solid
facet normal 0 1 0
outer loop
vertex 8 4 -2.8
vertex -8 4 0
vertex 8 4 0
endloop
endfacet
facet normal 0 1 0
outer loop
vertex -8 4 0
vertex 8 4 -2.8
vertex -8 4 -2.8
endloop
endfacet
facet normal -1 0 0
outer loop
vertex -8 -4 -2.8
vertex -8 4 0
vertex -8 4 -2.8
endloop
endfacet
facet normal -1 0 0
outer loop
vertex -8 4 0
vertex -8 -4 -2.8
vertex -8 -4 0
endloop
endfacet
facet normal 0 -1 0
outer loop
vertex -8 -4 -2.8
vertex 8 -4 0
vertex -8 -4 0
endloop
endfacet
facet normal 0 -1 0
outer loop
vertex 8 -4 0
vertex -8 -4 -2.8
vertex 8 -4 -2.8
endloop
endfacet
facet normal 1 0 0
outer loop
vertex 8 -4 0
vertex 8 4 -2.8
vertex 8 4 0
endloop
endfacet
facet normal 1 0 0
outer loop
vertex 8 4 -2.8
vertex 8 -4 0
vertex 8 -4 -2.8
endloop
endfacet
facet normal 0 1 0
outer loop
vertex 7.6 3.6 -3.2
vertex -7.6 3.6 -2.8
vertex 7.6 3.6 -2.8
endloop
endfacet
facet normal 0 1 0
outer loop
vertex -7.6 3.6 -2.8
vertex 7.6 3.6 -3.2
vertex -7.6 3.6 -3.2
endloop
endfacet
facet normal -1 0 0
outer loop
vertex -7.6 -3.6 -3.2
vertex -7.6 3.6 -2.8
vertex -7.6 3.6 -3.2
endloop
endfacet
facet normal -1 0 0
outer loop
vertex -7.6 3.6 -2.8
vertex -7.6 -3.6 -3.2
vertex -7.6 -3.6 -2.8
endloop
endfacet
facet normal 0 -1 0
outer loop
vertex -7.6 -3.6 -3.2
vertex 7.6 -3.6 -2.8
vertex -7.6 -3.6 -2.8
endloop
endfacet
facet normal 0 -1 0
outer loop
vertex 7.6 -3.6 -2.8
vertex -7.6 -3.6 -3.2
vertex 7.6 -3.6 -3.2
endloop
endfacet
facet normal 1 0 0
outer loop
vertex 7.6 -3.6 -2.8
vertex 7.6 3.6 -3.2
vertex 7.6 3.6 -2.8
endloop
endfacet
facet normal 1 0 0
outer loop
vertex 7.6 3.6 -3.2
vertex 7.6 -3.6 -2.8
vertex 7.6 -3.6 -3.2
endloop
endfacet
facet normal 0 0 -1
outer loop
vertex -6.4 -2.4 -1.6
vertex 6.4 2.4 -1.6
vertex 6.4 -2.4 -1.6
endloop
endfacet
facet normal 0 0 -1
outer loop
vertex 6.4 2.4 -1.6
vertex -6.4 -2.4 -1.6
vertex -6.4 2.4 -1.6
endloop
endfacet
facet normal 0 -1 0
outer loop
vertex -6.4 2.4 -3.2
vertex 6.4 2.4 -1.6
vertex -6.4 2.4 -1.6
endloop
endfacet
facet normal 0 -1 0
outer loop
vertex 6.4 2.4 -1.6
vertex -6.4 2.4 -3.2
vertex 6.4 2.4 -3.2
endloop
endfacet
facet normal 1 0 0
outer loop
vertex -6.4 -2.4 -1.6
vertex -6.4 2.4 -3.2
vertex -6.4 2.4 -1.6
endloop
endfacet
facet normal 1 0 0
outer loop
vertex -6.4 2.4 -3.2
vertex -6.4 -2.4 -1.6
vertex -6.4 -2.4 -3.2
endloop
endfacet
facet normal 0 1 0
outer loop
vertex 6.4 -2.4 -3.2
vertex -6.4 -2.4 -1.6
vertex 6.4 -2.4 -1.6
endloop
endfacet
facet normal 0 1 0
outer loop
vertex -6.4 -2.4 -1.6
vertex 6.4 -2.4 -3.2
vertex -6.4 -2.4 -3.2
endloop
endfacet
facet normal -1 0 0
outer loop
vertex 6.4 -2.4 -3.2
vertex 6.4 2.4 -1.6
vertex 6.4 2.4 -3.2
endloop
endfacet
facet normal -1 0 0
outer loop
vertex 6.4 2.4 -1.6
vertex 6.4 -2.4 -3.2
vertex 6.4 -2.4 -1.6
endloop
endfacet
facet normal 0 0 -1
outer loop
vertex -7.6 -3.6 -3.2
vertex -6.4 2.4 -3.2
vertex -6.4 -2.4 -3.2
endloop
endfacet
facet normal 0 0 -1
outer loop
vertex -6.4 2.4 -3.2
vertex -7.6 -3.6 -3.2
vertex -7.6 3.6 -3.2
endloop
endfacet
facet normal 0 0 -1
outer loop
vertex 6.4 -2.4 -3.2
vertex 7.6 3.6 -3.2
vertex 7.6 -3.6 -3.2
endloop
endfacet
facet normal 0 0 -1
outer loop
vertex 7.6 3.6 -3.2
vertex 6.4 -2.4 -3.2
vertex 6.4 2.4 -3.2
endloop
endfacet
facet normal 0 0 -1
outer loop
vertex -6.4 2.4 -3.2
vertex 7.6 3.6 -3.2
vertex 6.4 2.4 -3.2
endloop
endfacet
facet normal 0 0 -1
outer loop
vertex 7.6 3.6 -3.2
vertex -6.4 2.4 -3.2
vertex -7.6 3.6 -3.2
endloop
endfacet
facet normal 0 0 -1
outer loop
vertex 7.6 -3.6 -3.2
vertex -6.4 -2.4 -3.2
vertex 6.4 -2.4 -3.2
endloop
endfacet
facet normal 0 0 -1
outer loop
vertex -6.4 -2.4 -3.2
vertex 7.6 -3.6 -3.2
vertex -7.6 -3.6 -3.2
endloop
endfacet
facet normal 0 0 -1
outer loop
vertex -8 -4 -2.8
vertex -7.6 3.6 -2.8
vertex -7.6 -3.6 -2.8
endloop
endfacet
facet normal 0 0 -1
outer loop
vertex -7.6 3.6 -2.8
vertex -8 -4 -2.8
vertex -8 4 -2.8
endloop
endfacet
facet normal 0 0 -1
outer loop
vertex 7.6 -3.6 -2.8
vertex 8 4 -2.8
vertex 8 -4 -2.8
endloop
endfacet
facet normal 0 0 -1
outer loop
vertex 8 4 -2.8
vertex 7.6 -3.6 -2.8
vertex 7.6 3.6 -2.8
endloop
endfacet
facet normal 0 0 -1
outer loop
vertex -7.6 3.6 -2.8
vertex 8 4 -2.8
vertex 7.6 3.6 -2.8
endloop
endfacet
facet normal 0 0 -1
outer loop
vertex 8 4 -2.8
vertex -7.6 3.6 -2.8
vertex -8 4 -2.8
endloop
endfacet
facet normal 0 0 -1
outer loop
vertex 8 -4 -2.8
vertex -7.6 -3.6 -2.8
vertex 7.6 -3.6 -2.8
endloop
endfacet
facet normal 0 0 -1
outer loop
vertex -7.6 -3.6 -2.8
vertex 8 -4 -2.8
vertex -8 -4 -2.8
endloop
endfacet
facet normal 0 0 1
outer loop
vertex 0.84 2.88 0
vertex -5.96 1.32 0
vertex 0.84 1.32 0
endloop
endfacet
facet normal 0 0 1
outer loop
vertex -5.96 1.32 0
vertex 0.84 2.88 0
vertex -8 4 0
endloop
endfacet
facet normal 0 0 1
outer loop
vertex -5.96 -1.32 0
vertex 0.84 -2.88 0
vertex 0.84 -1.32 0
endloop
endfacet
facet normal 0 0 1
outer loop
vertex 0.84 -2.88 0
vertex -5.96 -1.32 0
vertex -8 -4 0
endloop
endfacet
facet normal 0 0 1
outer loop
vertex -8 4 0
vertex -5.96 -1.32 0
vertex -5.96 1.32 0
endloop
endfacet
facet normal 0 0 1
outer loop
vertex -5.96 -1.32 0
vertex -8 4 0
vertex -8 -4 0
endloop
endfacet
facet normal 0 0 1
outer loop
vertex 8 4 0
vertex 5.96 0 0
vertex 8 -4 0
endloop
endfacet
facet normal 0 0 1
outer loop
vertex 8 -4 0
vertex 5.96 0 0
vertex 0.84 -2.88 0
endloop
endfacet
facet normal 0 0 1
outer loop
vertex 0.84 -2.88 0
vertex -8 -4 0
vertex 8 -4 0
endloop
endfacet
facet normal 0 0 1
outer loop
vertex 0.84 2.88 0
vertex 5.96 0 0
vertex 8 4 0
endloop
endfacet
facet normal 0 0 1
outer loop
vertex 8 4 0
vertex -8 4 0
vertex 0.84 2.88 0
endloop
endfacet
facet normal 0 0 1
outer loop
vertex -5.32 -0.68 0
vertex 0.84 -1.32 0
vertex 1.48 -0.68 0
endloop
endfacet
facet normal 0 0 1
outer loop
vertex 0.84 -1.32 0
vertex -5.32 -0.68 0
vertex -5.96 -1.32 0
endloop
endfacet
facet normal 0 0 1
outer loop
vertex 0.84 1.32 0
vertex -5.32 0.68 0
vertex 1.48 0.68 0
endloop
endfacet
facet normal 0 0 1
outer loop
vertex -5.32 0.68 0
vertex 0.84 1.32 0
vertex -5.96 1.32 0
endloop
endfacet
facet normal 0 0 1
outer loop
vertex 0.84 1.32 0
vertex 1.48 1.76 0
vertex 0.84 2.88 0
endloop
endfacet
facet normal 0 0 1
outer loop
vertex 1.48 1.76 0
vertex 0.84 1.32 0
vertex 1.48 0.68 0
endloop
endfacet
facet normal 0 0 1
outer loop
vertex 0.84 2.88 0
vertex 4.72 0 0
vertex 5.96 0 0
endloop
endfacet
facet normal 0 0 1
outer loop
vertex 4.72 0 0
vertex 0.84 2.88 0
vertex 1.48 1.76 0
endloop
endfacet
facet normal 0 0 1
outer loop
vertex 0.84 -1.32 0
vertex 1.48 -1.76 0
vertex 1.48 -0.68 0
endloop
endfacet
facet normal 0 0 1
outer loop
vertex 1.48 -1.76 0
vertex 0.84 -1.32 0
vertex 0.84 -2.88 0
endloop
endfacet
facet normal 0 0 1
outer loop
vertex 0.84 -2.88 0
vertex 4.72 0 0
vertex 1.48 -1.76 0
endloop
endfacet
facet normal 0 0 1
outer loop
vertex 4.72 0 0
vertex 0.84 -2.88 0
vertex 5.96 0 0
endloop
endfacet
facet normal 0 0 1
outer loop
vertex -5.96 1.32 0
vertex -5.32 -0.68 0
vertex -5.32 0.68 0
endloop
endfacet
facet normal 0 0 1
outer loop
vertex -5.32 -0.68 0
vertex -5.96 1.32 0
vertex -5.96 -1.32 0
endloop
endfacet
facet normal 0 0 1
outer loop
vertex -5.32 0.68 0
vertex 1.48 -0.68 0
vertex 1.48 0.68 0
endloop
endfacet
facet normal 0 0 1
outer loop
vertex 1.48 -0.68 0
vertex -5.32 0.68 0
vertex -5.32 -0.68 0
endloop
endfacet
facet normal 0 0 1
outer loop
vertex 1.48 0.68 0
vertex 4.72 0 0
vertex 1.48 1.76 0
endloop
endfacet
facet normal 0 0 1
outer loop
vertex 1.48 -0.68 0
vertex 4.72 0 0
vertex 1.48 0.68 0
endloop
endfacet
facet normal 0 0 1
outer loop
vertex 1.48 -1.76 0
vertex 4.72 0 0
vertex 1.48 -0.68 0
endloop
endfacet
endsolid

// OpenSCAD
// file: ../p/4-4edge.scad
use <../lib.scad>
$fa=1; $fs=0.2;
function ldraw_lib__4_4edge(realsolid=false) = [
// 0 Circle 1.0
// 0 Name: 4-4edge.dat
// 0 Author: James Jessiman
// 0 !LDRAW_ORG Primitive UPDATE 2017-01
// 0 !LICENSE Licensed under CC BY 2.0 and CC BY 4.0 : see CAreadme.txt
// 
// 0 BFC CERTIFY CCW
  [0,"BFC","CERTIFY"],
  [0,"BFC","CCW"],
// 
// 0 !HISTORY 1998-12-15 [PTadmin] Official Update 1998-10
// 0 !HISTORY 2005-12-28 [PTadmin] Official Update 2005-01
// 0 !HISTORY 2007-06-24 [PTadmin] Header formatted for Contributor Agreement
// 0 !HISTORY 2008-07-01 [PTadmin] Official Update 2008-01
// 0 !HISTORY 2017-01-15 [Steffen] BFCed
// 0 !HISTORY 2017-12-30 [PTadmin] Official Update 2017-01
// 
// 
// 2 24 1 0 0 0.9239 0 0.3827
  [2,24,1,0,0,0.9239,0,0.3827],
// 2 24 0.9239 0 0.3827 0.7071 0 0.7071
  [2,24,0.9239,0,0.3827,0.7071,0,0.7071],
// 2 24 0.7071 0 0.7071 0.3827 0 0.9239
  [2,24,0.7071,0,0.7071,0.3827,0,0.9239],
// 2 24 0.3827 0 0.9239 0 0 1
  [2,24,0.3827,0,0.9239,0,0,1],
// 2 24 0 0 1 -0.3827 0 0.9239
  [2,24,0,0,1,-0.3827,0,0.9239],
// 2 24 -0.3827 0 0.9239 -0.7071 0 0.7071
  [2,24,-0.3827,0,0.9239,-0.7071,0,0.7071],
// 2 24 -0.7071 0 0.7071 -0.9239 0 0.3827
  [2,24,-0.7071,0,0.7071,-0.9239,0,0.3827],
// 2 24 -0.9239 0 0.3827 -1 0 -0
  [2,24,-0.9239,0,0.3827,-1,0,-0],
// 2 24 -1 0 -0 -0.9239 0 -0.3827
  [2,24,-1,0,-0,-0.9239,0,-0.3827],
// 2 24 -0.9239 0 -0.3827 -0.7071 0 -0.7071
  [2,24,-0.9239,0,-0.3827,-0.7071,0,-0.7071],
// 2 24 -0.7071 0 -0.7071 -0.3827 0 -0.9239
  [2,24,-0.7071,0,-0.7071,-0.3827,0,-0.9239],
// 2 24 -0.3827 0 -0.9239 0 0 -1
  [2,24,-0.3827,0,-0.9239,0,0,-1],
// 2 24 0 0 -1 0.3827 0 -0.9239
  [2,24,0,0,-1,0.3827,0,-0.9239],
// 2 24 0.3827 0 -0.9239 0.7071 0 -0.7071
  [2,24,0.3827,0,-0.9239,0.7071,0,-0.7071],
// 2 24 0.7071 0 -0.7071 0.9239 0 -0.3827
  [2,24,0.7071,0,-0.7071,0.9239,0,-0.3827],
// 2 24 0.9239 0 -0.3827 1 0 0
  [2,24,0.9239,0,-0.3827,1,0,0],
];
module ldraw_lib__4_4edge(step=0, col=false, unit=2/5, alt=false, line=0.2, solid=!$preview)
    makepoly(ldraw_lib__4_4edge(solid), step=step, col=col, unit=unit, alt=alt, line=line, solid=solid);
ldraw_lib__4_4edge(line=0.2);
// file: ../p/4-4disc.scad
use <../lib.scad>
$fa=1; $fs=0.2;
function ldraw_lib__4_4disc(realsolid=false) = [
// 0 Disc 1.0
// 0 Name: 4-4disc.dat
// 0 Author: James Jessiman
// 0 !LDRAW_ORG Primitive UPDATE 2002-02
// 0 !LICENSE Licensed under CC BY 2.0 and CC BY 4.0 : see CAreadme.txt
// 
// 0 BFC CERTIFY CCW
  [0,"BFC","CERTIFY"],
  [0,"BFC","CCW"],
// 
// 0 !HISTORY 1998-12-15 [PTadmin] Official Update 1998-10
// 0 !HISTORY 2002-03-23 [sbliss] Added BFC statement
// 0 !HISTORY 2002-04-25 [PTadmin] Official Update 2002-02
// 0 !HISTORY 2007-06-24 [PTadmin] Header formatted for Contributor Agreement
// 0 !HISTORY 2008-07-01 [PTadmin] Official Update 2008-01
// 
// 
// 3 16 0 0 0 1 0 0 0.9239 0 0.3827
  [3,16,0,0,0,1,0,0,0.9239,0,0.3827],
// 3 16 0 0 0 0.9239 0 0.3827 0.7071 0 0.7071
  [3,16,0,0,0,0.9239,0,0.3827,0.7071,0,0.7071],
// 3 16 0 0 0 0.7071 0 0.7071 0.3827 0 0.9239
  [3,16,0,0,0,0.7071,0,0.7071,0.3827,0,0.9239],
// 3 16 0 0 0 0.3827 0 0.9239 0 0 1
  [3,16,0,0,0,0.3827,0,0.9239,0,0,1],
// 3 16 0 0 0 0 0 1 -0.3827 0 0.9239
  [3,16,0,0,0,0,0,1,-0.3827,0,0.9239],
// 3 16 0 0 0 -0.3827 0 0.9239 -0.7071 0 0.7071
  [3,16,0,0,0,-0.3827,0,0.9239,-0.7071,0,0.7071],
// 3 16 0 0 0 -0.7071 0 0.7071 -0.9239 0 0.3827
  [3,16,0,0,0,-0.7071,0,0.7071,-0.9239,0,0.3827],
// 3 16 0 0 0 -0.9239 0 0.3827 -1 0 -0
  [3,16,0,0,0,-0.9239,0,0.3827,-1,0,-0],
// 3 16 0 0 0 -1 0 -0 -0.9239 0 -0.3827
  [3,16,0,0,0,-1,0,-0,-0.9239,0,-0.3827],
// 3 16 0 0 0 -0.9239 0 -0.3827 -0.7071 0 -0.7071
  [3,16,0,0,0,-0.9239,0,-0.3827,-0.7071,0,-0.7071],
// 3 16 0 0 0 -0.7071 0 -0.7071 -0.3827 0 -0.9239
  [3,16,0,0,0,-0.7071,0,-0.7071,-0.3827,0,-0.9239],
// 3 16 0 0 0 -0.3827 0 -0.9239 0 0 -1
  [3,16,0,0,0,-0.3827,0,-0.9239,0,0,-1],
// 3 16 0 0 0 0 0 -1 0.3827 0 -0.9239
  [3,16,0,0,0,0,0,-1,0.3827,0,-0.9239],
// 3 16 0 0 0 0.3827 0 -0.9239 0.7071 0 -0.7071
  [3,16,0,0,0,0.3827,0,-0.9239,0.7071,0,-0.7071],
// 3 16 0 0 0 0.7071 0 -0.7071 0.9239 0 -0.3827
  [3,16,0,0,0,0.7071,0,-0.7071,0.9239,0,-0.3827],
// 3 16 0 0 0 0.9239 0 -0.3827 1 0 0
  [3,16,0,0,0,0.9239,0,-0.3827,1,0,0],
// 0
];
module ldraw_lib__4_4disc(step=0, col=false, unit=2/5, alt=false, line=0.2, solid=!$preview)
    makepoly(ldraw_lib__4_4disc(solid), step=step, col=col, unit=unit, alt=alt, line=line, solid=solid);
ldraw_lib__4_4disc(line=0.2);
// file: ../p/4-4cyli.scad
use <../lib.scad>
$fa=1; $fs=0.2;
function ldraw_lib__4_4cyli(realsolid=false) = [
// 0 Cylinder 1.0
// 0 Name: 4-4cyli.dat
// 0 Author: James Jessiman
// 0 !LDRAW_ORG Primitive UPDATE 2005-01
// 0 !LICENSE Licensed under CC BY 2.0 and CC BY 4.0 : see CAreadme.txt
// 
// 0 BFC CERTIFY CCW
  [0,"BFC","CERTIFY"],
  [0,"BFC","CCW"],
// 
// 0 !HISTORY 1998-12-15 [PTadmin] Official Update 1998-10
// 0 !HISTORY 2002-03-23 [sbliss] Added BFC statement; merged headers from files in distributions LDraw 0.27 and Complete.
// 0 !HISTORY 2002-04-25 [PTadmin] Official Update 2002-02
// 0 !HISTORY 2004-12-14 [guyvivan] BFC CCW
// 0 !HISTORY 2005-12-28 [PTadmin] Official Update 2005-01
// 0 !HISTORY 2007-06-24 [PTadmin] Header formatted for Contributor Agreement
// 0 !HISTORY 2008-07-01 [PTadmin] Official Update 2008-01
// 
// 
// 4 16 1 1 0 0.9239 1 0.3827 0.9239 0 0.3827 1 0 0
  [4,16,1,1,0,0.9239,1,0.3827,0.9239,0,0.3827,1,0,0],
// 5 24 1 0 0 1 1 0 0.9239 0 0.3827 0.9239 0 -0.3827
  [5,24,1,0,0,1,1,0,0.9239,0,0.3827,0.9239,0,-0.3827],
// 4 16 0.9239 1 0.3827 0.7071 1 0.7071 0.7071 0 0.7071 0.9239 0 0.3827
  [4,16,0.9239,1,0.3827,0.7071,1,0.7071,0.7071,0,0.7071,0.9239,0,0.3827],
// 5 24 0.9239 0 0.3827 0.9239 1 0.3827 0.7071 0 0.7071 1 0 0
  [5,24,0.9239,0,0.3827,0.9239,1,0.3827,0.7071,0,0.7071,1,0,0],
// 4 16 0.7071 1 0.7071 0.3827 1 0.9239 0.3827 0 0.9239 0.7071 0 0.7071
  [4,16,0.7071,1,0.7071,0.3827,1,0.9239,0.3827,0,0.9239,0.7071,0,0.7071],
// 5 24 0.7071 0 0.7071 0.7071 1 0.7071 0.3827 0 0.9239 0.9239 0 0.3827
  [5,24,0.7071,0,0.7071,0.7071,1,0.7071,0.3827,0,0.9239,0.9239,0,0.3827],
// 4 16 0.3827 1 0.9239 0 1 1 0 0 1 0.3827 0 0.9239
  [4,16,0.3827,1,0.9239,0,1,1,0,0,1,0.3827,0,0.9239],
// 5 24 0.3827 0 0.9239 0.3827 1 0.9239 0 0 1 0.7071 0 0.7071
  [5,24,0.3827,0,0.9239,0.3827,1,0.9239,0,0,1,0.7071,0,0.7071],
// 4 16 0 1 1 -0.3827 1 0.9239 -0.3827 0 0.9239 0 0 1
  [4,16,0,1,1,-0.3827,1,0.9239,-0.3827,0,0.9239,0,0,1],
// 5 24 0 0 1 0 1 1 -0.3827 0 0.9239 0.3827 0 0.9239
  [5,24,0,0,1,0,1,1,-0.3827,0,0.9239,0.3827,0,0.9239],
// 4 16 -0.3827 1 0.9239 -0.7071 1 0.7071 -0.7071 0 0.7071 -0.3827 0 0.9239
  [4,16,-0.3827,1,0.9239,-0.7071,1,0.7071,-0.7071,0,0.7071,-0.3827,0,0.9239],
// 5 24 -0.3827 0 0.9239 -0.3827 1 0.9239 -0.7071 0 0.7071 0 0 1
  [5,24,-0.3827,0,0.9239,-0.3827,1,0.9239,-0.7071,0,0.7071,0,0,1],
// 4 16 -0.7071 1 0.7071 -0.9239 1 0.3827 -0.9239 0 0.3827 -0.7071 0 0.7071
  [4,16,-0.7071,1,0.7071,-0.9239,1,0.3827,-0.9239,0,0.3827,-0.7071,0,0.7071],
// 5 24 -0.7071 0 0.7071 -0.7071 1 0.7071 -0.9239 0 0.3827 -0.3827 0 0.9239
  [5,24,-0.7071,0,0.7071,-0.7071,1,0.7071,-0.9239,0,0.3827,-0.3827,0,0.9239],
// 4 16 -0.9239 1 0.3827 -1 1 0 -1 0 0 -0.9239 0 0.3827
  [4,16,-0.9239,1,0.3827,-1,1,0,-1,0,0,-0.9239,0,0.3827],
// 5 24 -0.9239 0 0.3827 -0.9239 1 0.3827 -1 0 0 -0.7071 0 0.7071
  [5,24,-0.9239,0,0.3827,-0.9239,1,0.3827,-1,0,0,-0.7071,0,0.7071],
// 4 16 -1 1 0 -0.9239 1 -0.3827 -0.9239 0 -0.3827 -1 0 0
  [4,16,-1,1,0,-0.9239,1,-0.3827,-0.9239,0,-0.3827,-1,0,0],
// 5 24 -1 0 0 -1 1 0 -0.9239 0 -0.3827 -0.9239 0 0.3827
  [5,24,-1,0,0,-1,1,0,-0.9239,0,-0.3827,-0.9239,0,0.3827],
// 4 16 -0.9239 1 -0.3827 -0.7071 1 -0.7071 -0.7071 0 -0.7071 -0.9239 0 -0.3827
  [4,16,-0.9239,1,-0.3827,-0.7071,1,-0.7071,-0.7071,0,-0.7071,-0.9239,0,-0.3827],
// 5 24 -0.9239 0 -0.3827 -0.9239 1 -0.3827 -0.7071 0 -0.7071 -1 0 0
  [5,24,-0.9239,0,-0.3827,-0.9239,1,-0.3827,-0.7071,0,-0.7071,-1,0,0],
// 4 16 -0.7071 1 -0.7071 -0.3827 1 -0.9239 -0.3827 0 -0.9239 -0.7071 0 -0.7071
  [4,16,-0.7071,1,-0.7071,-0.3827,1,-0.9239,-0.3827,0,-0.9239,-0.7071,0,-0.7071],
// 5 24 -0.7071 0 -0.7071 -0.7071 1 -0.7071 -0.3827 0 -0.9239 -0.9239 0 -0.3827
  [5,24,-0.7071,0,-0.7071,-0.7071,1,-0.7071,-0.3827,0,-0.9239,-0.9239,0,-0.3827],
// 4 16 -0.3827 1 -0.9239 0 1 -1 0 0 -1 -0.3827 0 -0.9239
  [4,16,-0.3827,1,-0.9239,0,1,-1,0,0,-1,-0.3827,0,-0.9239],
// 5 24 -0.3827 0 -0.9239 -0.3827 1 -0.9239 0 0 -1 -0.7071 0 -0.7071
  [5,24,-0.3827,0,-0.9239,-0.3827,1,-0.9239,0,0,-1,-0.7071,0,-0.7071],
// 4 16 0 1 -1 0.3827 1 -0.9239 0.3827 0 -0.9239 0 0 -1
  [4,16,0,1,-1,0.3827,1,-0.9239,0.3827,0,-0.9239,0,0,-1],
// 5 24 0 0 -1 0 1 -1 0.3827 0 -0.9239 -0.3827 0 -0.9239
  [5,24,0,0,-1,0,1,-1,0.3827,0,-0.9239,-0.3827,0,-0.9239],
// 4 16 0.3827 1 -0.9239 0.7071 1 -0.7071 0.7071 0 -0.7071 0.3827 0 -0.9239
  [4,16,0.3827,1,-0.9239,0.7071,1,-0.7071,0.7071,0,-0.7071,0.3827,0,-0.9239],
// 5 24 0.3827 0 -0.9239 0.3827 1 -0.9239 0.7071 0 -0.7071 0 0 -1
  [5,24,0.3827,0,-0.9239,0.3827,1,-0.9239,0.7071,0,-0.7071,0,0,-1],
// 4 16 0.7071 1 -0.7071 0.9239 1 -0.3827 0.9239 0 -0.3827 0.7071 0 -0.7071
  [4,16,0.7071,1,-0.7071,0.9239,1,-0.3827,0.9239,0,-0.3827,0.7071,0,-0.7071],
// 5 24 0.7071 0 -0.7071 0.7071 1 -0.7071 0.9239 0 -0.3827 0.3827 0 -0.9239
  [5,24,0.7071,0,-0.7071,0.7071,1,-0.7071,0.9239,0,-0.3827,0.3827,0,-0.9239],
// 4 16 0.9239 1 -0.3827 1 1 0 1 0 0 0.9239 0 -0.3827
  [4,16,0.9239,1,-0.3827,1,1,0,1,0,0,0.9239,0,-0.3827],
// 5 24 0.9239 0 -0.3827 0.9239 1 -0.3827 1 0 0 0.7071 0 -0.7071
  [5,24,0.9239,0,-0.3827,0.9239,1,-0.3827,1,0,0,0.7071,0,-0.7071],
// 0
];
module ldraw_lib__4_4cyli(step=0, col=false, unit=2/5, alt=false, line=0.2, solid=!$preview)
    makepoly(ldraw_lib__4_4cyli(solid), step=step, col=col, unit=unit, alt=alt, line=line, solid=solid);
ldraw_lib__4_4cyli(line=0.2);
// file: ../p/stud3.scad
use <../lib.scad>
use <4-4cyli.scad>
use <4-4disc.scad>
use <4-4edge.scad>
$fa=1; $fs=0.2;
function ldraw_lib__stud3(realsolid=false) = realsolid ? 
    [openscad(translate([0,0,-eps()], o=cylinder(4+eps(), r=4)),2)] : [
// 0 Stud Tube Solid
// 0 Name: stud3.dat
// 0 Author: James Jessiman
// 0 !LDRAW_ORG Primitive UPDATE 2012-01
// 0 !LICENSE Licensed under CC BY 2.0 and CC BY 4.0 : see CAreadme.txt
// 
// 0 BFC CERTIFY CCW
  [0,"BFC","CERTIFY"],
  [0,"BFC","CCW"],
// 
// 0 !HISTORY 2002-04-04 [sbliss] Modified for BFC compliance
// 0 !HISTORY 2002-04-25 [PTadmin] Official Update 2002-02
// 0 !HISTORY 2007-06-24 [PTadmin] Header formatted for Contributor Agreement
// 0 !HISTORY 2008-07-01 [PTadmin] Official Update 2008-01
// 0 !HISTORY 2012-02-16 [Philo] Changed to CCW
// 0 !HISTORY 2012-03-30 [PTadmin] Official Update 2012-01
// 
// 
// 1 16 0 -4 0 4 0 0 0 1 0 0 0 4 4-4edge.dat
  [1,16,0,-4,0,4,0,0,0,1,0,0,0,4, ldraw_lib__4_4edge(realsolid)],
// 1 16 0 0 0 4 0 0 0 1 0 0 0 4 4-4edge.dat
  [1,16,0,0,0,4,0,0,0,1,0,0,0,4, ldraw_lib__4_4edge(realsolid)],
// 1 16 0 -4 0 4 0 0 0 1 0 0 0 4 4-4disc.dat
  [1,16,0,-4,0,4,0,0,0,1,0,0,0,4, ldraw_lib__4_4disc(realsolid)],
// 1 16 0 -4 0 4 0 0 0 4 0 0 0 4 4-4cyli.dat
  [1,16,0,-4,0,4,0,0,0,4,0,0,0,4, ldraw_lib__4_4cyli(realsolid)],
];
module ldraw_lib__stud3(step=0, col=false, unit=2/5, alt=false, line=0.2, solid=!$preview)
    makepoly(ldraw_lib__stud3(solid), step=step, col=col, unit=unit, alt=alt, line=line, solid=solid);
ldraw_lib__stud3(line=0.2);
// file: ../p/stud.scad
use <../lib.scad>
use <4-4cyli.scad>
use <4-4disc.scad>
use <4-4edge.scad>
$fa=1; $fs=0.2;
function ldraw_lib__stud(realsolid=false) = realsolid ? 
    [openscad(translate([0,0,-eps()], o=cylinder(4+eps(), r=6)),2)] : [
// 0 Stud
// 0 Name: stud.dat
// 0 Author: James Jessiman
// 0 !LDRAW_ORG Primitive UPDATE 2012-01
// 0 !LICENSE Licensed under CC BY 2.0 and CC BY 4.0 : see CAreadme.txt
// 
// 0 BFC CERTIFY CCW
  [0,"BFC","CERTIFY"],
  [0,"BFC","CCW"],
// 
// 0 !HISTORY 2002-04-04 [sbliss] Modified for BFC compliance
// 0 !HISTORY 2002-04-25 [PTadmin] Official Update 2002-02
// 0 !HISTORY 2007-06-24 [PTadmin] Header formatted for Contributor Agreement
// 0 !HISTORY 2008-07-01 [PTadmin] Official Update 2008-01
// 0 !HISTORY 2012-02-16 [Philo] Changed to CCW
// 0 !HISTORY 2012-03-30 [PTadmin] Official Update 2012-01
// 
// 
// 1 16 0 0 0 6 0 0 0 1 0 0 0 6 4-4edge.dat
  [1,16,0,0,0,6,0,0,0,1,0,0,0,6, ldraw_lib__4_4edge(realsolid)],
// 1 16 0 -4 0 6 0 0 0 1 0 0 0 6 4-4edge.dat
  [1,16,0,-4,0,6,0,0,0,1,0,0,0,6, ldraw_lib__4_4edge(realsolid)],
// 1 16 0 0 0 6 0 0 0 -4 0 0 0 6 4-4cyli.dat
  [1,16,0,0,0,6,0,0,0,-4,0,0,0,6, ldraw_lib__4_4cyli(realsolid)],
// 1 16 0 -4 0 6 0 0 0 1 0 0 0 6 4-4disc.dat
  [1,16,0,-4,0,6,0,0,0,1,0,0,0,6, ldraw_lib__4_4disc(realsolid)],
];
module ldraw_lib__stud(step=0, col=false, unit=2/5, alt=false, line=0.2, solid=!$preview)
    makepoly(ldraw_lib__stud(solid), step=step, col=col, unit=unit, alt=alt, line=line, solid=solid);
ldraw_lib__stud(line=0.2);
// file: ../p/box4t.scad
use <../lib.scad>
$fa=1; $fs=0.2;
function ldraw_lib__box4t(realsolid=false) = [
// 0 Box with 4 Adjacent Faces and All Edges
// 0 Name: box4t.dat
// 0 Author: Tore Eriksson [Tore_Eriksson]
// 0 !LDRAW_ORG Primitive UPDATE 2003-02
// 0 !LICENSE Licensed under CC BY 2.0 and CC BY 4.0 : see CAreadme.txt
// 
// 0 BFC CERTIFY CCW
  [0,"BFC","CERTIFY"],
  [0,"BFC","CCW"],
// 
// 0 !HISTORY 1997-09-29 [PTadmin] Official Update 1997-15
// 0 !HISTORY 2002-08-31 [izanette] Modified with WINDZ for BFC compliance
// 0 !HISTORY 2003-08-01 [PTadmin] Official Update 2003-02
// 0 !HISTORY 2007-06-24 [PTadmin] Header formatted for Contributor Agreement
// 0 !HISTORY 2008-07-01 [PTadmin] Official Update 2008-01
// 
// 
// 2 24 1 1 1 -1 1 1
  [2,24,1,1,1,-1,1,1],
// 2 24 -1 1 1 -1 1 -1
  [2,24,-1,1,1,-1,1,-1],
// 2 24 -1 1 -1 1 1 -1
  [2,24,-1,1,-1,1,1,-1],
// 2 24 1 1 -1 1 1 1
  [2,24,1,1,-1,1,1,1],
// 2 24 1 0 1 -1 0 1
  [2,24,1,0,1,-1,0,1],
// 2 24 -1 0 1 -1 0 -1
  [2,24,-1,0,1,-1,0,-1],
// 2 24 -1 0 -1 1 0 -1
  [2,24,-1,0,-1,1,0,-1],
// 2 24 1 0 -1 1 0 1
  [2,24,1,0,-1,1,0,1],
// 2 24 1 0 1 1 1 1
  [2,24,1,0,1,1,1,1],
// 2 24 -1 0 1 -1 1 1
  [2,24,-1,0,1,-1,1,1],
// 2 24 1 0 -1 1 1 -1
  [2,24,1,0,-1,1,1,-1],
// 2 24 -1 0 -1 -1 1 -1
  [2,24,-1,0,-1,-1,1,-1],
// 4 16 1 1 1 1 1 -1 -1 1 -1 -1 1 1
  [4,16,1,1,1,1,1,-1,-1,1,-1,-1,1,1],
// 4 16 1 1 1 -1 1 1 -1 0 1 1 0 1
  [4,16,1,1,1,-1,1,1,-1,0,1,1,0,1],
// 4 16 -1 1 1 -1 1 -1 -1 0 -1 -1 0 1
  [4,16,-1,1,1,-1,1,-1,-1,0,-1,-1,0,1],
// 0 4 16 -1 1 -1 -1 0 -1 1 0 -1 1 1 -1
// 4 16 1 1 -1 1 1 1 1 0 1 1 0 -1
  [4,16,1,1,-1,1,1,1,1,0,1,1,0,-1],
// 0
];
module ldraw_lib__box4t(step=0, col=false, unit=2/5, alt=false, line=0.2, solid=!$preview)
    makepoly(ldraw_lib__box4t(solid), step=step, col=col, unit=unit, alt=alt, line=line, solid=solid);
ldraw_lib__box4t(line=0.2);
// file: ../p/box5.scad
use <../lib.scad>
$fa=1; $fs=0.2;
function ldraw_lib__box5(realsolid=false) = [
// 0 Box with 5 Faces and All Edges
// 0 Name: box5.dat
// 0 Author: James Jessiman
// 0 !LDRAW_ORG Primitive UPDATE 2012-01
// 0 !LICENSE Licensed under CC BY 2.0 and CC BY 4.0 : see CAreadme.txt
// 
// 0 BFC CERTIFY CCW
  [0,"BFC","CERTIFY"],
  [0,"BFC","CCW"],
// 
// 0 !HISTORY 2002-04-03 [sbliss] Modified for BFC compliance
// 0 !HISTORY 2002-04-25 [PTadmin] Official Update 2002-02
// 0 !HISTORY 2007-06-24 [PTadmin] Header formatted for Contributor Agreement
// 0 !HISTORY 2008-07-01 [PTadmin] Official Update 2008-01
// 0 !HISTORY 2012-02-16 [Philo] Changed to CCW
// 0 !HISTORY 2012-03-30 [PTadmin] Official Update 2012-01
// 
// 
// 2 24 1 1 1 -1 1 1
  [2,24,1,1,1,-1,1,1],
// 2 24 -1 1 1 -1 1 -1
  [2,24,-1,1,1,-1,1,-1],
// 2 24 -1 1 -1 1 1 -1
  [2,24,-1,1,-1,1,1,-1],
// 2 24 1 1 -1 1 1 1
  [2,24,1,1,-1,1,1,1],
// 2 24 1 0 1 -1 0 1
  [2,24,1,0,1,-1,0,1],
// 2 24 -1 0 1 -1 0 -1
  [2,24,-1,0,1,-1,0,-1],
// 2 24 -1 0 -1 1 0 -1
  [2,24,-1,0,-1,1,0,-1],
// 2 24 1 0 -1 1 0 1
  [2,24,1,0,-1,1,0,1],
// 2 24 1 0 1 1 1 1
  [2,24,1,0,1,1,1,1],
// 2 24 -1 0 1 -1 1 1
  [2,24,-1,0,1,-1,1,1],
// 2 24 1 0 -1 1 1 -1
  [2,24,1,0,-1,1,1,-1],
// 2 24 -1 0 -1 -1 1 -1
  [2,24,-1,0,-1,-1,1,-1],
// 4 16 -1 1 1 1 1 1 1 1 -1 -1 1 -1
  [4,16,-1,1,1,1,1,1,1,1,-1,-1,1,-1],
// 4 16 -1 1 1 -1 0 1 1 0 1 1 1 1
  [4,16,-1,1,1,-1,0,1,1,0,1,1,1,1],
// 4 16 -1 1 -1 -1 0 -1 -1 0 1 -1 1 1
  [4,16,-1,1,-1,-1,0,-1,-1,0,1,-1,1,1],
// 4 16 1 1 -1 1 0 -1 -1 0 -1 -1 1 -1
  [4,16,1,1,-1,1,0,-1,-1,0,-1,-1,1,-1],
// 4 16 1 1 1 1 0 1 1 0 -1 1 1 -1
  [4,16,1,1,1,1,0,1,1,0,-1,1,1,-1],
];
module ldraw_lib__box5(step=0, col=false, unit=2/5, alt=false, line=0.2, solid=!$preview)
    makepoly(ldraw_lib__box5(solid), step=step, col=col, unit=unit, alt=alt, line=line, solid=solid);
ldraw_lib__box5(line=0.2);
// file: ../p/box4.scad
use <../lib.scad>
$fa=1; $fs=0.2;
function ldraw_lib__box4(realsolid=false) = [
// 0 Box with 4 Faces (2 Parallel Pairs) and All Edges
// 0 Name: box4.dat
// 0 Author: James Jessiman
// 0 !LDRAW_ORG Primitive UPDATE 2012-01
// 0 !LICENSE Licensed under CC BY 2.0 and CC BY 4.0 : see CAreadme.txt
// 
// 0 BFC CERTIFY CCW
  [0,"BFC","CERTIFY"],
  [0,"BFC","CCW"],
// 
// 0 !HISTORY 2002-04-03 [sbliss] Modified for BFC compliance
// 0 !HISTORY 2002-04-25 [PTadmin] Official Update 2002-02
// 0 !HISTORY 2007-06-24 [PTadmin] Header formatted for Contributor Agreement
// 0 !HISTORY 2008-07-01 [PTadmin] Official Update 2008-01
// 0 !HISTORY 2012-02-16 [Philo] Changed to CCW
// 0 !HISTORY 2012-03-30 [PTadmin] Official Update 2012-01
// 
// 
// 2 24 1 1 1 -1 1 1
  [2,24,1,1,1,-1,1,1],
// 2 24 -1 1 1 -1 1 -1
  [2,24,-1,1,1,-1,1,-1],
// 2 24 -1 1 -1 1 1 -1
  [2,24,-1,1,-1,1,1,-1],
// 2 24 1 1 -1 1 1 1
  [2,24,1,1,-1,1,1,1],
// 2 24 1 0 1 -1 0 1
  [2,24,1,0,1,-1,0,1],
// 2 24 -1 0 1 -1 0 -1
  [2,24,-1,0,1,-1,0,-1],
// 2 24 -1 0 -1 1 0 -1
  [2,24,-1,0,-1,1,0,-1],
// 2 24 1 0 -1 1 0 1
  [2,24,1,0,-1,1,0,1],
// 2 24 1 0 1 1 1 1
  [2,24,1,0,1,1,1,1],
// 2 24 -1 0 1 -1 1 1
  [2,24,-1,0,1,-1,1,1],
// 2 24 1 0 -1 1 1 -1
  [2,24,1,0,-1,1,1,-1],
// 2 24 -1 0 -1 -1 1 -1
  [2,24,-1,0,-1,-1,1,-1],
// 4 16 -1 1 1 -1 0 1 1 0 1 1 1 1
  [4,16,-1,1,1,-1,0,1,1,0,1,1,1,1],
// 4 16 -1 1 -1 -1 0 -1 -1 0 1 -1 1 1
  [4,16,-1,1,-1,-1,0,-1,-1,0,1,-1,1,1],
// 4 16 1 1 -1 1 0 -1 -1 0 -1 -1 1 -1
  [4,16,1,1,-1,1,0,-1,-1,0,-1,-1,1,-1],
// 4 16 1 1 1 1 0 1 1 0 -1 1 1 -1
  [4,16,1,1,1,1,0,1,1,0,-1,1,1,-1],
];
module ldraw_lib__box4(step=0, col=false, unit=2/5, alt=false, line=0.2, solid=!$preview)
    makepoly(ldraw_lib__box4(solid), step=step, col=col, unit=unit, alt=alt, line=line, solid=solid);
ldraw_lib__box4(line=0.2);
// file: s/3004s01.scad
use <../../lib.scad>
use <../../p/box4t.scad>
use <../../p/box5.scad>
use <../../p/stud.scad>
use <../../p/stud3.scad>
$fa=1; $fs=0.2;
function ldraw_lib__s__3004s01(realsolid=false) = [
// 0 ~Brick  1 x  2 without Front Face
// 0 Name: s\3004s01.dat
// 0 Author: James Jessiman
// 0 !LDRAW_ORG Subpart UPDATE 2003-03
// 0 !LICENSE Licensed under CC BY 2.0 and CC BY 4.0 : see CAreadme.txt
// 
// 0 BFC CERTIFY CCW
  [0,"BFC","CERTIFY"],
  [0,"BFC","CCW"],
// 
// 0 !HISTORY 2003-09-07 [jriley] Subfiling, BFC
// 0 !HISTORY 2003-12-19 [PTadmin] Official Update 2003-03
// 0 !HISTORY 2007-08-29 [PTadmin] Header formatted for Contributor Agreement
// 0 !HISTORY 2008-07-01 [PTadmin] Official Update 2008-01
// 
// 
// 1 16 0 4 0 1 0 0 0 -5 0 0 0 1 stud3.dat
  [1,16,0,4,0,1,0,0,0,-5,0,0,0,1, ldraw_lib__stud3(realsolid)],
// 0 BFC INVERTNEXT
  [0,"BFC","INVERTNEXT"],
// 1 16 0 24 0 16 0 0 0 -20 0 0 0 6 box5.dat
  [1,16,0,24,0,16,0,0,0,-20,0,0,0,6, ldraw_lib__box5(realsolid)],
// 4 16 20 24 10 16 24 6 -16 24 6 -20 24 10
  [4,16,20,24,10,16,24,6,-16,24,6,-20,24,10],
// 4 16 -20 24 10 -16 24 6 -16 24 -6 -20 24 -10
  [4,16,-20,24,10,-16,24,6,-16,24,-6,-20,24,-10],
// 4 16 -20 24 -10 -16 24 -6 16 24 -6 20 24 -10
  [4,16,-20,24,-10,-16,24,-6,16,24,-6,20,24,-10],
// 4 16 20 24 -10 16 24 -6 16 24 6 20 24 10
  [4,16,20,24,-10,16,24,-6,16,24,6,20,24,10],
// 1 16 0 24 0 20 0 0 0 -24 0 0 0 10 box4t.dat
  [1,16,0,24,0,20,0,0,0,-24,0,0,0,10, ldraw_lib__box4t(realsolid)],
// 1 16 10 0 0 1 0 0 0 1 0 0 0 1 stud.dat
  [1,16,10,0,0,1,0,0,0,1,0,0,0,1, ldraw_lib__stud(realsolid)],
// 1 16 -10 0 0 1 0 0 0 1 0 0 0 1 stud.dat
  [1,16,-10,0,0,1,0,0,0,1,0,0,0,1, ldraw_lib__stud(realsolid)],
// 0
];
module ldraw_lib__s__3004s01(step=0, col=false, unit=2/5, alt=false, line=0.2, solid=!$preview)
    makepoly(ldraw_lib__s__3004s01(solid), step=step, col=col, unit=unit, alt=alt, line=line, solid=solid);
ldraw_lib__s__3004s01(line=0.2);
// file: s/3069p06c.scad
use <../../lib.scad>
$fa=1; $fs=0.2;
function ldraw_lib__s__3069p06c(realsolid=false) = [
// 0 ~Tile  1 x  2 with Arrow Long Pattern (Arrow)
// 0 Name: s\3069p06c.dat
// 0 Author: William Howard [WilliamH]
// 0 !LDRAW_ORG Subpart UPDATE 2009-03
// 0 !LICENSE Licensed under CC BY 2.0 and CC BY 4.0 : see CAreadme.txt
// 
// 0 BFC CERTIFY CCW
  [0,"BFC","CERTIFY"],
  [0,"BFC","CCW"],
// 
// 0 !HISTORY 2009-05-02 [PTadmin] Official Update 2009-01
// 0 !HISTORY 2009-08-18 [anathema] Improved pattern
// 0 !HISTORY 2009-12-29 [PTadmin] Official Update 2009-03
// 
// 
// 4 16 -13.3 0 -1.7 3.7 0 -1.7 3.7 0 1.7 -13.3 0 1.7
  [4,16,-13.3,0,-1.7,3.7,0,-1.7,3.7,0,1.7,-13.3,0,1.7],
// 3 16 3.7 0 1.7 11.8 0 0 3.7 0 4.4
  [3,16,3.7,0,1.7,11.8,0,0,3.7,0,4.4],
// 3 16 3.7 0 -1.7 11.8 0 0 3.7 0 1.7
  [3,16,3.7,0,-1.7,11.8,0,0,3.7,0,1.7],
// 3 16 3.7 0 -4.4 11.8 0 0 3.7 0 -1.7
  [3,16,3.7,0,-4.4,11.8,0,0,3.7,0,-1.7],
// 0
];
module ldraw_lib__s__3069p06c(step=0, col=false, unit=2/5, alt=false, line=0.2, solid=!$preview)
    makepoly(ldraw_lib__s__3069p06c(solid), step=step, col=col, unit=unit, alt=alt, line=line, solid=solid);
ldraw_lib__s__3069p06c(line=0.2);
// file: s/3069p06b.scad
use <../../lib.scad>
$fa=1; $fs=0.2;
function ldraw_lib__s__3069p06b(realsolid=false) = [
// 0 ~Tile  1 x  2 with Arrow Long Pattern (Border)
// 0 Name: s\3069p06b.dat
// 0 Author: William Howard [WilliamH]
// 0 !LDRAW_ORG Subpart UPDATE 2009-03
// 0 !LICENSE Licensed under CC BY 2.0 and CC BY 4.0 : see CAreadme.txt
// 
// 0 BFC CERTIFY CCW
  [0,"BFC","CERTIFY"],
  [0,"BFC","CCW"],
// 
// 0 !HISTORY 2009-05-02 [PTadmin] Official Update 2009-01
// 0 !HISTORY 2009-08-18 [anathema] Improved pattern
// 0 !HISTORY 2009-10-09 [cwdee] Corrected small overlap
// 0 !HISTORY 2009-12-29 [PTadmin] Official Update 2009-03
// 
// 
// 4 16 -14.9 0 -3.3 2.1 0 -3.3 3.7 0 -1.7 -13.3 0 -1.7
  [4,16,-14.9,0,-3.3,2.1,0,-3.3,3.7,0,-1.7,-13.3,0,-1.7],
// 4 16 -13.3 0 1.7 3.7 0 1.7 2.1 0 3.3 -14.9 0 3.3
  [4,16,-13.3,0,1.7,3.7,0,1.7,2.1,0,3.3,-14.9,0,3.3],
// 4 16 2.1 0 7.2 2.1 0 3.3 3.7 0 1.7 3.7 0 4.4
  [4,16,2.1,0,7.2,2.1,0,3.3,3.7,0,1.7,3.7,0,4.4],
// 4 16 3.7 0 4.4 11.8 0 0 14.9 0 0 2.1 0 7.2
  [4,16,3.7,0,4.4,11.8,0,0,14.9,0,0,2.1,0,7.2],
// 4 16 3.7 0 -4.4 3.7 0 -1.7 2.1 0 -3.3 2.1 0 -7.2
  [4,16,3.7,0,-4.4,3.7,0,-1.7,2.1,0,-3.3,2.1,0,-7.2],
// 4 16 2.1 0 -7.2 14.9 0 0 11.8 0 0 3.7 0 -4.4
  [4,16,2.1,0,-7.2,14.9,0,0,11.8,0,0,3.7,0,-4.4],
// 4 16 -14.9 0 3.3 -14.9 0 -3.3 -13.3 0 -1.7 -13.3 0 1.7
  [4,16,-14.9,0,3.3,-14.9,0,-3.3,-13.3,0,-1.7,-13.3,0,1.7],
// 0
];
module ldraw_lib__s__3069p06b(step=0, col=false, unit=2/5, alt=false, line=0.2, solid=!$preview)
    makepoly(ldraw_lib__s__3069p06b(solid), step=step, col=col, unit=unit, alt=alt, line=line, solid=solid);
ldraw_lib__s__3069p06b(line=0.2);
// file: s/3069p06a.scad
use <../../lib.scad>
$fa=1; $fs=0.2;
function ldraw_lib__s__3069p06a(realsolid=false) = [
// 0 ~Tile  1 x  2 with Arrow Long Pattern (Mask)
// 0 Name: s\3069p06a.dat
// 0 Author: William Howard [WilliamH]
// 0 !LDRAW_ORG Subpart UPDATE 2009-03
// 0 !LICENSE Licensed under CC BY 2.0 and CC BY 4.0 : see CAreadme.txt
// 
// 0 BFC CERTIFY CCW
  [0,"BFC","CERTIFY"],
  [0,"BFC","CCW"],
// 
// 0 !HISTORY 2009-05-02 [PTadmin] Official Update 2009-01
// 0 !HISTORY 2009-08-18 [anathema] Improved pattern
// 0 !HISTORY 2009-12-29 [PTadmin] Official Update 2009-03
// 
// 
// 4 16 -14.9 0 3.3 2.1 0 3.3 2.1 0 7.2 -20 0 10
  [4,16,-14.9,0,3.3,2.1,0,3.3,2.1,0,7.2,-20,0,10],
// 4 16 -20 0 -10 2.1 0 -7.2 2.1 0 -3.3 -14.9 0 -3.3
  [4,16,-20,0,-10,2.1,0,-7.2,2.1,0,-3.3,-14.9,0,-3.3],
// 4 16 -20 0 10 -20 0 -10 -14.9 0 -3.3 -14.9 0 3.3
  [4,16,-20,0,10,-20,0,-10,-14.9,0,-3.3,-14.9,0,3.3],
// 3 16 20 0 10 14.9 0 0 20 0 -10
  [3,16,20,0,10,14.9,0,0,20,0,-10],
// 3 16 20 0 -10 14.9 0 0 2.1 0 -7.2
  [3,16,20,0,-10,14.9,0,0,2.1,0,-7.2],
// 3 16 2.1 0 -7.2 -20 0 -10 20 0 -10
  [3,16,2.1,0,-7.2,-20,0,-10,20,0,-10],
// 3 16 2.1 0 7.2 14.9 0 0 20 0 10
  [3,16,2.1,0,7.2,14.9,0,0,20,0,10],
// 3 16 20 0 10 -20 0 10 2.1 0 7.2
  [3,16,20,0,10,-20,0,10,2.1,0,7.2],
// 0
];
module ldraw_lib__s__3069p06a(step=0, col=false, unit=2/5, alt=false, line=0.2, solid=!$preview)
    makepoly(ldraw_lib__s__3069p06a(solid), step=step, col=col, unit=unit, alt=alt, line=line, solid=solid);
ldraw_lib__s__3069p06a(line=0.2);
// file: s/3069bs01.scad
use <../../lib.scad>
use <../../p/box4.scad>
use <../../p/box5.scad>
$fa=1; $fs=0.2;
function ldraw_lib__s__3069bs01(realsolid=false) = [
// 0 ~Tile  1 x  2 with Groove without Top Face
// 0 Name: s\3069bs01.dat
// 0 Author: Santeri Piippo [arezey]
// 0 !LDRAW_ORG Subpart UPDATE 2010-02
// 0 !LICENSE Licensed under CC BY 2.0 and CC BY 4.0 : see CAreadme.txt
// 
// 0 BFC CERTIFY CCW
  [0,"BFC","CERTIFY"],
  [0,"BFC","CCW"],
// 
// 0 !HISTORY 2010-07-05 [PTadmin] Official Update 2010-02
// 
// 
// 1 16 0 0 0 20 0 0 0 7 0 0 0 10 box4.dat
  [1,16,0,0,0,20,0,0,0,7,0,0,0,10, ldraw_lib__box4(realsolid)],
// 1 16 0 7 0 19 0 0 0 1 0 0 0 9 box4.dat
  [1,16,0,7,0,19,0,0,0,1,0,0,0,9, ldraw_lib__box4(realsolid)],
// 0 BFC INVERTNEXT
  [0,"BFC","INVERTNEXT"],
// 1 16 0 8 0 16 0 0 0 -4 0 0 0 6 box5.dat
  [1,16,0,8,0,16,0,0,0,-4,0,0,0,6, ldraw_lib__box5(realsolid)],
// 4 16 -19 8 9 -16 8 6 -16 8 -6 -19 8 -9
  [4,16,-19,8,9,-16,8,6,-16,8,-6,-19,8,-9],
// 4 16 19 8 -9 16 8 -6 16 8 6 19 8 9
  [4,16,19,8,-9,16,8,-6,16,8,6,19,8,9],
// 4 16 19 8 9 16 8 6 -16 8 6 -19 8 9
  [4,16,19,8,9,16,8,6,-16,8,6,-19,8,9],
// 4 16 -19 8 -9 -16 8 -6 16 8 -6 19 8 -9
  [4,16,-19,8,-9,-16,8,-6,16,8,-6,19,8,-9],
// 4 16 -20 7 10 -19 7 9 -19 7 -9 -20 7 -10
  [4,16,-20,7,10,-19,7,9,-19,7,-9,-20,7,-10],
// 4 16 20 7 -10 19 7 -9 19 7 9 20 7 10
  [4,16,20,7,-10,19,7,-9,19,7,9,20,7,10],
// 4 16 20 7 10 19 7 9 -19 7 9 -20 7 10
  [4,16,20,7,10,19,7,9,-19,7,9,-20,7,10],
// 4 16 -20 7 -10 -19 7 -9 19 7 -9 20 7 -10
  [4,16,-20,7,-10,-19,7,-9,19,7,-9,20,7,-10],
// 0 //
];
module ldraw_lib__s__3069bs01(step=0, col=false, unit=2/5, alt=false, line=0.2, solid=!$preview)
    makepoly(ldraw_lib__s__3069bs01(solid), step=step, col=col, unit=unit, alt=alt, line=line, solid=solid);
ldraw_lib__s__3069bs01(line=0.2);
// file: 3004.scad
use <../lib.scad>
use <s/3004s01.scad>
$fa=1; $fs=0.2;
function ldraw_lib__3004(realsolid=false) = [
// 0 Brick  1 x  2
// 0 Name: 3004.dat
// 0 Author: James Jessiman
// 0 !LDRAW_ORG Part UPDATE 2022-05
// 0 !LICENSE Licensed under CC BY 2.0 and CC BY 4.0 : see CAreadme.txt
// 
// 0 BFC CERTIFY CCW
  [0,"BFC","CERTIFY"],
  [0,"BFC","CCW"],
// 
// 0 !HISTORY 2001-10-26 [PTadmin] Official Update 2001-01
// 0 !HISTORY 2002-05-07 {unknown} BFC Certification
// 0 !HISTORY 2002-06-11 [PTadmin] Official Update 2002-03
// 0 !HISTORY 2007-05-07 [PTadmin] Header formatted for Contributor Agreement
// 0 !HISTORY 2008-07-01 [PTadmin] Official Update 2008-01
// 0 !HISTORY 2022-08-04 [MagFors] Using subfile
// 0 !HISTORY 2022-09-15 [PTadmin] Official Update 2022-05
// 
// 
// 1 16 0 0 0 1 0 0 0 1 0 0 0 1 s\3004s01.dat
  [1,16,0,0,0,1,0,0,0,1,0,0,0,1, ldraw_lib__s__3004s01(realsolid)],
// 4 16 -20 24 -10 20 24 -10 20 0 -10 -20 0 -10
  [4,16,-20,24,-10,20,24,-10,20,0,-10,-20,0,-10],
];
module ldraw_lib__3004(step=0, col=false, unit=2/5, alt=false, line=0.2, solid=!$preview)
    makepoly(ldraw_lib__3004(solid), step=step, col=col, unit=unit, alt=alt, line=line, solid=solid);
ldraw_lib__3004(line=0.2);
// file: 3069bp12.scad
use <../lib.scad>
use <s/3069bs01.scad>
use <s/3069p06a.scad>
use <s/3069p06b.scad>
use <s/3069p06c.scad>
$fa=1; $fs=0.2;
function ldraw_lib__3069bp12(realsolid=false) = [
// 0 Tile  1 x  2 with Arrow Long Black Pattern
// 0 Name: 3069bp12.dat
// 0 Author: James Jessiman
// 0 !LDRAW_ORG Part UPDATE 2009-03
// 0 !LICENSE Licensed under CC BY 2.0 and CC BY 4.0 : see CAreadme.txt
// 
// 0 BFC CERTIFY CCW
  [0,"BFC","CERTIFY"],
  [0,"BFC","CCW"],
// 
// 0 !HISTORY 2007-06-13 [PTadmin] Header formatted for Contributor Agreement
// 0 !HISTORY 2008-07-01 [PTadmin] Official Update 2008-01
// 0 !HISTORY 2009-07-16 [PTadmin] Renamed from 3069p12
// 0 !HISTORY 2009-07-16 [arezey] BFC'd
// 0 !HISTORY 2009-08-19 [anathema] Rewrote using subparts
// 0 !HISTORY 2009-12-29 [PTadmin] Official Update 2009-03
// 
// 
// 1 16 0 0 0 1 0 0 0 1 0 0 0 1 s\3069bs01.dat
  [1,16,0,0,0,1,0,0,0,1,0,0,0,1, ldraw_lib__s__3069bs01(realsolid)],
// 1 16 0 0 0 1 0 0 0 1 0 0 0 1 s\3069p06a.dat
  [1,16,0,0,0,1,0,0,0,1,0,0,0,1, ldraw_lib__s__3069p06a(realsolid)],
// 1 0 0 0 0 1 0 0 0 1 0 0 0 1 s\3069p06b.dat
  [1,0,0,0,0,1,0,0,0,1,0,0,0,1, ldraw_lib__s__3069p06b(realsolid)],
// 1 0 0 0 0 1 0 0 0 1 0 0 0 1 s\3069p06c.dat
  [1,0,0,0,0,1,0,0,0,1,0,0,0,1, ldraw_lib__s__3069p06c(realsolid)],
// 0
];
module ldraw_lib__3069bp12(step=0, col=false, unit=2/5, alt=false, line=0.2, solid=!$preview)
    makepoly(ldraw_lib__3069bp12(solid), step=step, col=col, unit=unit, alt=alt, line=line, solid=solid);
ldraw_lib__3069bp12(line=0.2);
// main file
use <../lib.scad>
use <3069bp12.scad>
$fa=1; $fs=0.2;
function ldraw_lib__3069p12(realsolid=false) = [
// 0 ~Moved to 3069bp12
// 0 Name: 3069p12.dat
// 0 Author: [PTadmin]
// 0 !LDRAW_ORG Part UPDATE 2009-03
// 0 !LICENSE Licensed under CC BY 4.0 : see CAreadme.txt
// 
// 0 BFC CERTIFY CCW
  [0,"BFC","CERTIFY"],
  [0,"BFC","CCW"],
// 
// 0 !HISTORY 2009-12-29 [PTadmin] Official Update 2009-03
// 
// 
// 0 // Tile 1 x 2 with Long Black Arrow Pattern
// 1 16 0 0 0 1 0 0 0 1 0 0 0 1 3069bp12.dat
  [1,16,0,0,0,1,0,0,0,1,0,0,0,1, ldraw_lib__3069bp12(realsolid)],
];
module ldraw_lib__3069p12(step=0, col=false, unit=2/5, alt=false, line=0.2, solid=!$preview)
    makepoly(ldraw_lib__3069p12(solid), step=step, col=col, unit=unit, alt=alt, line=line, solid=solid);
ldraw_lib__3069p12(line=0.2);
